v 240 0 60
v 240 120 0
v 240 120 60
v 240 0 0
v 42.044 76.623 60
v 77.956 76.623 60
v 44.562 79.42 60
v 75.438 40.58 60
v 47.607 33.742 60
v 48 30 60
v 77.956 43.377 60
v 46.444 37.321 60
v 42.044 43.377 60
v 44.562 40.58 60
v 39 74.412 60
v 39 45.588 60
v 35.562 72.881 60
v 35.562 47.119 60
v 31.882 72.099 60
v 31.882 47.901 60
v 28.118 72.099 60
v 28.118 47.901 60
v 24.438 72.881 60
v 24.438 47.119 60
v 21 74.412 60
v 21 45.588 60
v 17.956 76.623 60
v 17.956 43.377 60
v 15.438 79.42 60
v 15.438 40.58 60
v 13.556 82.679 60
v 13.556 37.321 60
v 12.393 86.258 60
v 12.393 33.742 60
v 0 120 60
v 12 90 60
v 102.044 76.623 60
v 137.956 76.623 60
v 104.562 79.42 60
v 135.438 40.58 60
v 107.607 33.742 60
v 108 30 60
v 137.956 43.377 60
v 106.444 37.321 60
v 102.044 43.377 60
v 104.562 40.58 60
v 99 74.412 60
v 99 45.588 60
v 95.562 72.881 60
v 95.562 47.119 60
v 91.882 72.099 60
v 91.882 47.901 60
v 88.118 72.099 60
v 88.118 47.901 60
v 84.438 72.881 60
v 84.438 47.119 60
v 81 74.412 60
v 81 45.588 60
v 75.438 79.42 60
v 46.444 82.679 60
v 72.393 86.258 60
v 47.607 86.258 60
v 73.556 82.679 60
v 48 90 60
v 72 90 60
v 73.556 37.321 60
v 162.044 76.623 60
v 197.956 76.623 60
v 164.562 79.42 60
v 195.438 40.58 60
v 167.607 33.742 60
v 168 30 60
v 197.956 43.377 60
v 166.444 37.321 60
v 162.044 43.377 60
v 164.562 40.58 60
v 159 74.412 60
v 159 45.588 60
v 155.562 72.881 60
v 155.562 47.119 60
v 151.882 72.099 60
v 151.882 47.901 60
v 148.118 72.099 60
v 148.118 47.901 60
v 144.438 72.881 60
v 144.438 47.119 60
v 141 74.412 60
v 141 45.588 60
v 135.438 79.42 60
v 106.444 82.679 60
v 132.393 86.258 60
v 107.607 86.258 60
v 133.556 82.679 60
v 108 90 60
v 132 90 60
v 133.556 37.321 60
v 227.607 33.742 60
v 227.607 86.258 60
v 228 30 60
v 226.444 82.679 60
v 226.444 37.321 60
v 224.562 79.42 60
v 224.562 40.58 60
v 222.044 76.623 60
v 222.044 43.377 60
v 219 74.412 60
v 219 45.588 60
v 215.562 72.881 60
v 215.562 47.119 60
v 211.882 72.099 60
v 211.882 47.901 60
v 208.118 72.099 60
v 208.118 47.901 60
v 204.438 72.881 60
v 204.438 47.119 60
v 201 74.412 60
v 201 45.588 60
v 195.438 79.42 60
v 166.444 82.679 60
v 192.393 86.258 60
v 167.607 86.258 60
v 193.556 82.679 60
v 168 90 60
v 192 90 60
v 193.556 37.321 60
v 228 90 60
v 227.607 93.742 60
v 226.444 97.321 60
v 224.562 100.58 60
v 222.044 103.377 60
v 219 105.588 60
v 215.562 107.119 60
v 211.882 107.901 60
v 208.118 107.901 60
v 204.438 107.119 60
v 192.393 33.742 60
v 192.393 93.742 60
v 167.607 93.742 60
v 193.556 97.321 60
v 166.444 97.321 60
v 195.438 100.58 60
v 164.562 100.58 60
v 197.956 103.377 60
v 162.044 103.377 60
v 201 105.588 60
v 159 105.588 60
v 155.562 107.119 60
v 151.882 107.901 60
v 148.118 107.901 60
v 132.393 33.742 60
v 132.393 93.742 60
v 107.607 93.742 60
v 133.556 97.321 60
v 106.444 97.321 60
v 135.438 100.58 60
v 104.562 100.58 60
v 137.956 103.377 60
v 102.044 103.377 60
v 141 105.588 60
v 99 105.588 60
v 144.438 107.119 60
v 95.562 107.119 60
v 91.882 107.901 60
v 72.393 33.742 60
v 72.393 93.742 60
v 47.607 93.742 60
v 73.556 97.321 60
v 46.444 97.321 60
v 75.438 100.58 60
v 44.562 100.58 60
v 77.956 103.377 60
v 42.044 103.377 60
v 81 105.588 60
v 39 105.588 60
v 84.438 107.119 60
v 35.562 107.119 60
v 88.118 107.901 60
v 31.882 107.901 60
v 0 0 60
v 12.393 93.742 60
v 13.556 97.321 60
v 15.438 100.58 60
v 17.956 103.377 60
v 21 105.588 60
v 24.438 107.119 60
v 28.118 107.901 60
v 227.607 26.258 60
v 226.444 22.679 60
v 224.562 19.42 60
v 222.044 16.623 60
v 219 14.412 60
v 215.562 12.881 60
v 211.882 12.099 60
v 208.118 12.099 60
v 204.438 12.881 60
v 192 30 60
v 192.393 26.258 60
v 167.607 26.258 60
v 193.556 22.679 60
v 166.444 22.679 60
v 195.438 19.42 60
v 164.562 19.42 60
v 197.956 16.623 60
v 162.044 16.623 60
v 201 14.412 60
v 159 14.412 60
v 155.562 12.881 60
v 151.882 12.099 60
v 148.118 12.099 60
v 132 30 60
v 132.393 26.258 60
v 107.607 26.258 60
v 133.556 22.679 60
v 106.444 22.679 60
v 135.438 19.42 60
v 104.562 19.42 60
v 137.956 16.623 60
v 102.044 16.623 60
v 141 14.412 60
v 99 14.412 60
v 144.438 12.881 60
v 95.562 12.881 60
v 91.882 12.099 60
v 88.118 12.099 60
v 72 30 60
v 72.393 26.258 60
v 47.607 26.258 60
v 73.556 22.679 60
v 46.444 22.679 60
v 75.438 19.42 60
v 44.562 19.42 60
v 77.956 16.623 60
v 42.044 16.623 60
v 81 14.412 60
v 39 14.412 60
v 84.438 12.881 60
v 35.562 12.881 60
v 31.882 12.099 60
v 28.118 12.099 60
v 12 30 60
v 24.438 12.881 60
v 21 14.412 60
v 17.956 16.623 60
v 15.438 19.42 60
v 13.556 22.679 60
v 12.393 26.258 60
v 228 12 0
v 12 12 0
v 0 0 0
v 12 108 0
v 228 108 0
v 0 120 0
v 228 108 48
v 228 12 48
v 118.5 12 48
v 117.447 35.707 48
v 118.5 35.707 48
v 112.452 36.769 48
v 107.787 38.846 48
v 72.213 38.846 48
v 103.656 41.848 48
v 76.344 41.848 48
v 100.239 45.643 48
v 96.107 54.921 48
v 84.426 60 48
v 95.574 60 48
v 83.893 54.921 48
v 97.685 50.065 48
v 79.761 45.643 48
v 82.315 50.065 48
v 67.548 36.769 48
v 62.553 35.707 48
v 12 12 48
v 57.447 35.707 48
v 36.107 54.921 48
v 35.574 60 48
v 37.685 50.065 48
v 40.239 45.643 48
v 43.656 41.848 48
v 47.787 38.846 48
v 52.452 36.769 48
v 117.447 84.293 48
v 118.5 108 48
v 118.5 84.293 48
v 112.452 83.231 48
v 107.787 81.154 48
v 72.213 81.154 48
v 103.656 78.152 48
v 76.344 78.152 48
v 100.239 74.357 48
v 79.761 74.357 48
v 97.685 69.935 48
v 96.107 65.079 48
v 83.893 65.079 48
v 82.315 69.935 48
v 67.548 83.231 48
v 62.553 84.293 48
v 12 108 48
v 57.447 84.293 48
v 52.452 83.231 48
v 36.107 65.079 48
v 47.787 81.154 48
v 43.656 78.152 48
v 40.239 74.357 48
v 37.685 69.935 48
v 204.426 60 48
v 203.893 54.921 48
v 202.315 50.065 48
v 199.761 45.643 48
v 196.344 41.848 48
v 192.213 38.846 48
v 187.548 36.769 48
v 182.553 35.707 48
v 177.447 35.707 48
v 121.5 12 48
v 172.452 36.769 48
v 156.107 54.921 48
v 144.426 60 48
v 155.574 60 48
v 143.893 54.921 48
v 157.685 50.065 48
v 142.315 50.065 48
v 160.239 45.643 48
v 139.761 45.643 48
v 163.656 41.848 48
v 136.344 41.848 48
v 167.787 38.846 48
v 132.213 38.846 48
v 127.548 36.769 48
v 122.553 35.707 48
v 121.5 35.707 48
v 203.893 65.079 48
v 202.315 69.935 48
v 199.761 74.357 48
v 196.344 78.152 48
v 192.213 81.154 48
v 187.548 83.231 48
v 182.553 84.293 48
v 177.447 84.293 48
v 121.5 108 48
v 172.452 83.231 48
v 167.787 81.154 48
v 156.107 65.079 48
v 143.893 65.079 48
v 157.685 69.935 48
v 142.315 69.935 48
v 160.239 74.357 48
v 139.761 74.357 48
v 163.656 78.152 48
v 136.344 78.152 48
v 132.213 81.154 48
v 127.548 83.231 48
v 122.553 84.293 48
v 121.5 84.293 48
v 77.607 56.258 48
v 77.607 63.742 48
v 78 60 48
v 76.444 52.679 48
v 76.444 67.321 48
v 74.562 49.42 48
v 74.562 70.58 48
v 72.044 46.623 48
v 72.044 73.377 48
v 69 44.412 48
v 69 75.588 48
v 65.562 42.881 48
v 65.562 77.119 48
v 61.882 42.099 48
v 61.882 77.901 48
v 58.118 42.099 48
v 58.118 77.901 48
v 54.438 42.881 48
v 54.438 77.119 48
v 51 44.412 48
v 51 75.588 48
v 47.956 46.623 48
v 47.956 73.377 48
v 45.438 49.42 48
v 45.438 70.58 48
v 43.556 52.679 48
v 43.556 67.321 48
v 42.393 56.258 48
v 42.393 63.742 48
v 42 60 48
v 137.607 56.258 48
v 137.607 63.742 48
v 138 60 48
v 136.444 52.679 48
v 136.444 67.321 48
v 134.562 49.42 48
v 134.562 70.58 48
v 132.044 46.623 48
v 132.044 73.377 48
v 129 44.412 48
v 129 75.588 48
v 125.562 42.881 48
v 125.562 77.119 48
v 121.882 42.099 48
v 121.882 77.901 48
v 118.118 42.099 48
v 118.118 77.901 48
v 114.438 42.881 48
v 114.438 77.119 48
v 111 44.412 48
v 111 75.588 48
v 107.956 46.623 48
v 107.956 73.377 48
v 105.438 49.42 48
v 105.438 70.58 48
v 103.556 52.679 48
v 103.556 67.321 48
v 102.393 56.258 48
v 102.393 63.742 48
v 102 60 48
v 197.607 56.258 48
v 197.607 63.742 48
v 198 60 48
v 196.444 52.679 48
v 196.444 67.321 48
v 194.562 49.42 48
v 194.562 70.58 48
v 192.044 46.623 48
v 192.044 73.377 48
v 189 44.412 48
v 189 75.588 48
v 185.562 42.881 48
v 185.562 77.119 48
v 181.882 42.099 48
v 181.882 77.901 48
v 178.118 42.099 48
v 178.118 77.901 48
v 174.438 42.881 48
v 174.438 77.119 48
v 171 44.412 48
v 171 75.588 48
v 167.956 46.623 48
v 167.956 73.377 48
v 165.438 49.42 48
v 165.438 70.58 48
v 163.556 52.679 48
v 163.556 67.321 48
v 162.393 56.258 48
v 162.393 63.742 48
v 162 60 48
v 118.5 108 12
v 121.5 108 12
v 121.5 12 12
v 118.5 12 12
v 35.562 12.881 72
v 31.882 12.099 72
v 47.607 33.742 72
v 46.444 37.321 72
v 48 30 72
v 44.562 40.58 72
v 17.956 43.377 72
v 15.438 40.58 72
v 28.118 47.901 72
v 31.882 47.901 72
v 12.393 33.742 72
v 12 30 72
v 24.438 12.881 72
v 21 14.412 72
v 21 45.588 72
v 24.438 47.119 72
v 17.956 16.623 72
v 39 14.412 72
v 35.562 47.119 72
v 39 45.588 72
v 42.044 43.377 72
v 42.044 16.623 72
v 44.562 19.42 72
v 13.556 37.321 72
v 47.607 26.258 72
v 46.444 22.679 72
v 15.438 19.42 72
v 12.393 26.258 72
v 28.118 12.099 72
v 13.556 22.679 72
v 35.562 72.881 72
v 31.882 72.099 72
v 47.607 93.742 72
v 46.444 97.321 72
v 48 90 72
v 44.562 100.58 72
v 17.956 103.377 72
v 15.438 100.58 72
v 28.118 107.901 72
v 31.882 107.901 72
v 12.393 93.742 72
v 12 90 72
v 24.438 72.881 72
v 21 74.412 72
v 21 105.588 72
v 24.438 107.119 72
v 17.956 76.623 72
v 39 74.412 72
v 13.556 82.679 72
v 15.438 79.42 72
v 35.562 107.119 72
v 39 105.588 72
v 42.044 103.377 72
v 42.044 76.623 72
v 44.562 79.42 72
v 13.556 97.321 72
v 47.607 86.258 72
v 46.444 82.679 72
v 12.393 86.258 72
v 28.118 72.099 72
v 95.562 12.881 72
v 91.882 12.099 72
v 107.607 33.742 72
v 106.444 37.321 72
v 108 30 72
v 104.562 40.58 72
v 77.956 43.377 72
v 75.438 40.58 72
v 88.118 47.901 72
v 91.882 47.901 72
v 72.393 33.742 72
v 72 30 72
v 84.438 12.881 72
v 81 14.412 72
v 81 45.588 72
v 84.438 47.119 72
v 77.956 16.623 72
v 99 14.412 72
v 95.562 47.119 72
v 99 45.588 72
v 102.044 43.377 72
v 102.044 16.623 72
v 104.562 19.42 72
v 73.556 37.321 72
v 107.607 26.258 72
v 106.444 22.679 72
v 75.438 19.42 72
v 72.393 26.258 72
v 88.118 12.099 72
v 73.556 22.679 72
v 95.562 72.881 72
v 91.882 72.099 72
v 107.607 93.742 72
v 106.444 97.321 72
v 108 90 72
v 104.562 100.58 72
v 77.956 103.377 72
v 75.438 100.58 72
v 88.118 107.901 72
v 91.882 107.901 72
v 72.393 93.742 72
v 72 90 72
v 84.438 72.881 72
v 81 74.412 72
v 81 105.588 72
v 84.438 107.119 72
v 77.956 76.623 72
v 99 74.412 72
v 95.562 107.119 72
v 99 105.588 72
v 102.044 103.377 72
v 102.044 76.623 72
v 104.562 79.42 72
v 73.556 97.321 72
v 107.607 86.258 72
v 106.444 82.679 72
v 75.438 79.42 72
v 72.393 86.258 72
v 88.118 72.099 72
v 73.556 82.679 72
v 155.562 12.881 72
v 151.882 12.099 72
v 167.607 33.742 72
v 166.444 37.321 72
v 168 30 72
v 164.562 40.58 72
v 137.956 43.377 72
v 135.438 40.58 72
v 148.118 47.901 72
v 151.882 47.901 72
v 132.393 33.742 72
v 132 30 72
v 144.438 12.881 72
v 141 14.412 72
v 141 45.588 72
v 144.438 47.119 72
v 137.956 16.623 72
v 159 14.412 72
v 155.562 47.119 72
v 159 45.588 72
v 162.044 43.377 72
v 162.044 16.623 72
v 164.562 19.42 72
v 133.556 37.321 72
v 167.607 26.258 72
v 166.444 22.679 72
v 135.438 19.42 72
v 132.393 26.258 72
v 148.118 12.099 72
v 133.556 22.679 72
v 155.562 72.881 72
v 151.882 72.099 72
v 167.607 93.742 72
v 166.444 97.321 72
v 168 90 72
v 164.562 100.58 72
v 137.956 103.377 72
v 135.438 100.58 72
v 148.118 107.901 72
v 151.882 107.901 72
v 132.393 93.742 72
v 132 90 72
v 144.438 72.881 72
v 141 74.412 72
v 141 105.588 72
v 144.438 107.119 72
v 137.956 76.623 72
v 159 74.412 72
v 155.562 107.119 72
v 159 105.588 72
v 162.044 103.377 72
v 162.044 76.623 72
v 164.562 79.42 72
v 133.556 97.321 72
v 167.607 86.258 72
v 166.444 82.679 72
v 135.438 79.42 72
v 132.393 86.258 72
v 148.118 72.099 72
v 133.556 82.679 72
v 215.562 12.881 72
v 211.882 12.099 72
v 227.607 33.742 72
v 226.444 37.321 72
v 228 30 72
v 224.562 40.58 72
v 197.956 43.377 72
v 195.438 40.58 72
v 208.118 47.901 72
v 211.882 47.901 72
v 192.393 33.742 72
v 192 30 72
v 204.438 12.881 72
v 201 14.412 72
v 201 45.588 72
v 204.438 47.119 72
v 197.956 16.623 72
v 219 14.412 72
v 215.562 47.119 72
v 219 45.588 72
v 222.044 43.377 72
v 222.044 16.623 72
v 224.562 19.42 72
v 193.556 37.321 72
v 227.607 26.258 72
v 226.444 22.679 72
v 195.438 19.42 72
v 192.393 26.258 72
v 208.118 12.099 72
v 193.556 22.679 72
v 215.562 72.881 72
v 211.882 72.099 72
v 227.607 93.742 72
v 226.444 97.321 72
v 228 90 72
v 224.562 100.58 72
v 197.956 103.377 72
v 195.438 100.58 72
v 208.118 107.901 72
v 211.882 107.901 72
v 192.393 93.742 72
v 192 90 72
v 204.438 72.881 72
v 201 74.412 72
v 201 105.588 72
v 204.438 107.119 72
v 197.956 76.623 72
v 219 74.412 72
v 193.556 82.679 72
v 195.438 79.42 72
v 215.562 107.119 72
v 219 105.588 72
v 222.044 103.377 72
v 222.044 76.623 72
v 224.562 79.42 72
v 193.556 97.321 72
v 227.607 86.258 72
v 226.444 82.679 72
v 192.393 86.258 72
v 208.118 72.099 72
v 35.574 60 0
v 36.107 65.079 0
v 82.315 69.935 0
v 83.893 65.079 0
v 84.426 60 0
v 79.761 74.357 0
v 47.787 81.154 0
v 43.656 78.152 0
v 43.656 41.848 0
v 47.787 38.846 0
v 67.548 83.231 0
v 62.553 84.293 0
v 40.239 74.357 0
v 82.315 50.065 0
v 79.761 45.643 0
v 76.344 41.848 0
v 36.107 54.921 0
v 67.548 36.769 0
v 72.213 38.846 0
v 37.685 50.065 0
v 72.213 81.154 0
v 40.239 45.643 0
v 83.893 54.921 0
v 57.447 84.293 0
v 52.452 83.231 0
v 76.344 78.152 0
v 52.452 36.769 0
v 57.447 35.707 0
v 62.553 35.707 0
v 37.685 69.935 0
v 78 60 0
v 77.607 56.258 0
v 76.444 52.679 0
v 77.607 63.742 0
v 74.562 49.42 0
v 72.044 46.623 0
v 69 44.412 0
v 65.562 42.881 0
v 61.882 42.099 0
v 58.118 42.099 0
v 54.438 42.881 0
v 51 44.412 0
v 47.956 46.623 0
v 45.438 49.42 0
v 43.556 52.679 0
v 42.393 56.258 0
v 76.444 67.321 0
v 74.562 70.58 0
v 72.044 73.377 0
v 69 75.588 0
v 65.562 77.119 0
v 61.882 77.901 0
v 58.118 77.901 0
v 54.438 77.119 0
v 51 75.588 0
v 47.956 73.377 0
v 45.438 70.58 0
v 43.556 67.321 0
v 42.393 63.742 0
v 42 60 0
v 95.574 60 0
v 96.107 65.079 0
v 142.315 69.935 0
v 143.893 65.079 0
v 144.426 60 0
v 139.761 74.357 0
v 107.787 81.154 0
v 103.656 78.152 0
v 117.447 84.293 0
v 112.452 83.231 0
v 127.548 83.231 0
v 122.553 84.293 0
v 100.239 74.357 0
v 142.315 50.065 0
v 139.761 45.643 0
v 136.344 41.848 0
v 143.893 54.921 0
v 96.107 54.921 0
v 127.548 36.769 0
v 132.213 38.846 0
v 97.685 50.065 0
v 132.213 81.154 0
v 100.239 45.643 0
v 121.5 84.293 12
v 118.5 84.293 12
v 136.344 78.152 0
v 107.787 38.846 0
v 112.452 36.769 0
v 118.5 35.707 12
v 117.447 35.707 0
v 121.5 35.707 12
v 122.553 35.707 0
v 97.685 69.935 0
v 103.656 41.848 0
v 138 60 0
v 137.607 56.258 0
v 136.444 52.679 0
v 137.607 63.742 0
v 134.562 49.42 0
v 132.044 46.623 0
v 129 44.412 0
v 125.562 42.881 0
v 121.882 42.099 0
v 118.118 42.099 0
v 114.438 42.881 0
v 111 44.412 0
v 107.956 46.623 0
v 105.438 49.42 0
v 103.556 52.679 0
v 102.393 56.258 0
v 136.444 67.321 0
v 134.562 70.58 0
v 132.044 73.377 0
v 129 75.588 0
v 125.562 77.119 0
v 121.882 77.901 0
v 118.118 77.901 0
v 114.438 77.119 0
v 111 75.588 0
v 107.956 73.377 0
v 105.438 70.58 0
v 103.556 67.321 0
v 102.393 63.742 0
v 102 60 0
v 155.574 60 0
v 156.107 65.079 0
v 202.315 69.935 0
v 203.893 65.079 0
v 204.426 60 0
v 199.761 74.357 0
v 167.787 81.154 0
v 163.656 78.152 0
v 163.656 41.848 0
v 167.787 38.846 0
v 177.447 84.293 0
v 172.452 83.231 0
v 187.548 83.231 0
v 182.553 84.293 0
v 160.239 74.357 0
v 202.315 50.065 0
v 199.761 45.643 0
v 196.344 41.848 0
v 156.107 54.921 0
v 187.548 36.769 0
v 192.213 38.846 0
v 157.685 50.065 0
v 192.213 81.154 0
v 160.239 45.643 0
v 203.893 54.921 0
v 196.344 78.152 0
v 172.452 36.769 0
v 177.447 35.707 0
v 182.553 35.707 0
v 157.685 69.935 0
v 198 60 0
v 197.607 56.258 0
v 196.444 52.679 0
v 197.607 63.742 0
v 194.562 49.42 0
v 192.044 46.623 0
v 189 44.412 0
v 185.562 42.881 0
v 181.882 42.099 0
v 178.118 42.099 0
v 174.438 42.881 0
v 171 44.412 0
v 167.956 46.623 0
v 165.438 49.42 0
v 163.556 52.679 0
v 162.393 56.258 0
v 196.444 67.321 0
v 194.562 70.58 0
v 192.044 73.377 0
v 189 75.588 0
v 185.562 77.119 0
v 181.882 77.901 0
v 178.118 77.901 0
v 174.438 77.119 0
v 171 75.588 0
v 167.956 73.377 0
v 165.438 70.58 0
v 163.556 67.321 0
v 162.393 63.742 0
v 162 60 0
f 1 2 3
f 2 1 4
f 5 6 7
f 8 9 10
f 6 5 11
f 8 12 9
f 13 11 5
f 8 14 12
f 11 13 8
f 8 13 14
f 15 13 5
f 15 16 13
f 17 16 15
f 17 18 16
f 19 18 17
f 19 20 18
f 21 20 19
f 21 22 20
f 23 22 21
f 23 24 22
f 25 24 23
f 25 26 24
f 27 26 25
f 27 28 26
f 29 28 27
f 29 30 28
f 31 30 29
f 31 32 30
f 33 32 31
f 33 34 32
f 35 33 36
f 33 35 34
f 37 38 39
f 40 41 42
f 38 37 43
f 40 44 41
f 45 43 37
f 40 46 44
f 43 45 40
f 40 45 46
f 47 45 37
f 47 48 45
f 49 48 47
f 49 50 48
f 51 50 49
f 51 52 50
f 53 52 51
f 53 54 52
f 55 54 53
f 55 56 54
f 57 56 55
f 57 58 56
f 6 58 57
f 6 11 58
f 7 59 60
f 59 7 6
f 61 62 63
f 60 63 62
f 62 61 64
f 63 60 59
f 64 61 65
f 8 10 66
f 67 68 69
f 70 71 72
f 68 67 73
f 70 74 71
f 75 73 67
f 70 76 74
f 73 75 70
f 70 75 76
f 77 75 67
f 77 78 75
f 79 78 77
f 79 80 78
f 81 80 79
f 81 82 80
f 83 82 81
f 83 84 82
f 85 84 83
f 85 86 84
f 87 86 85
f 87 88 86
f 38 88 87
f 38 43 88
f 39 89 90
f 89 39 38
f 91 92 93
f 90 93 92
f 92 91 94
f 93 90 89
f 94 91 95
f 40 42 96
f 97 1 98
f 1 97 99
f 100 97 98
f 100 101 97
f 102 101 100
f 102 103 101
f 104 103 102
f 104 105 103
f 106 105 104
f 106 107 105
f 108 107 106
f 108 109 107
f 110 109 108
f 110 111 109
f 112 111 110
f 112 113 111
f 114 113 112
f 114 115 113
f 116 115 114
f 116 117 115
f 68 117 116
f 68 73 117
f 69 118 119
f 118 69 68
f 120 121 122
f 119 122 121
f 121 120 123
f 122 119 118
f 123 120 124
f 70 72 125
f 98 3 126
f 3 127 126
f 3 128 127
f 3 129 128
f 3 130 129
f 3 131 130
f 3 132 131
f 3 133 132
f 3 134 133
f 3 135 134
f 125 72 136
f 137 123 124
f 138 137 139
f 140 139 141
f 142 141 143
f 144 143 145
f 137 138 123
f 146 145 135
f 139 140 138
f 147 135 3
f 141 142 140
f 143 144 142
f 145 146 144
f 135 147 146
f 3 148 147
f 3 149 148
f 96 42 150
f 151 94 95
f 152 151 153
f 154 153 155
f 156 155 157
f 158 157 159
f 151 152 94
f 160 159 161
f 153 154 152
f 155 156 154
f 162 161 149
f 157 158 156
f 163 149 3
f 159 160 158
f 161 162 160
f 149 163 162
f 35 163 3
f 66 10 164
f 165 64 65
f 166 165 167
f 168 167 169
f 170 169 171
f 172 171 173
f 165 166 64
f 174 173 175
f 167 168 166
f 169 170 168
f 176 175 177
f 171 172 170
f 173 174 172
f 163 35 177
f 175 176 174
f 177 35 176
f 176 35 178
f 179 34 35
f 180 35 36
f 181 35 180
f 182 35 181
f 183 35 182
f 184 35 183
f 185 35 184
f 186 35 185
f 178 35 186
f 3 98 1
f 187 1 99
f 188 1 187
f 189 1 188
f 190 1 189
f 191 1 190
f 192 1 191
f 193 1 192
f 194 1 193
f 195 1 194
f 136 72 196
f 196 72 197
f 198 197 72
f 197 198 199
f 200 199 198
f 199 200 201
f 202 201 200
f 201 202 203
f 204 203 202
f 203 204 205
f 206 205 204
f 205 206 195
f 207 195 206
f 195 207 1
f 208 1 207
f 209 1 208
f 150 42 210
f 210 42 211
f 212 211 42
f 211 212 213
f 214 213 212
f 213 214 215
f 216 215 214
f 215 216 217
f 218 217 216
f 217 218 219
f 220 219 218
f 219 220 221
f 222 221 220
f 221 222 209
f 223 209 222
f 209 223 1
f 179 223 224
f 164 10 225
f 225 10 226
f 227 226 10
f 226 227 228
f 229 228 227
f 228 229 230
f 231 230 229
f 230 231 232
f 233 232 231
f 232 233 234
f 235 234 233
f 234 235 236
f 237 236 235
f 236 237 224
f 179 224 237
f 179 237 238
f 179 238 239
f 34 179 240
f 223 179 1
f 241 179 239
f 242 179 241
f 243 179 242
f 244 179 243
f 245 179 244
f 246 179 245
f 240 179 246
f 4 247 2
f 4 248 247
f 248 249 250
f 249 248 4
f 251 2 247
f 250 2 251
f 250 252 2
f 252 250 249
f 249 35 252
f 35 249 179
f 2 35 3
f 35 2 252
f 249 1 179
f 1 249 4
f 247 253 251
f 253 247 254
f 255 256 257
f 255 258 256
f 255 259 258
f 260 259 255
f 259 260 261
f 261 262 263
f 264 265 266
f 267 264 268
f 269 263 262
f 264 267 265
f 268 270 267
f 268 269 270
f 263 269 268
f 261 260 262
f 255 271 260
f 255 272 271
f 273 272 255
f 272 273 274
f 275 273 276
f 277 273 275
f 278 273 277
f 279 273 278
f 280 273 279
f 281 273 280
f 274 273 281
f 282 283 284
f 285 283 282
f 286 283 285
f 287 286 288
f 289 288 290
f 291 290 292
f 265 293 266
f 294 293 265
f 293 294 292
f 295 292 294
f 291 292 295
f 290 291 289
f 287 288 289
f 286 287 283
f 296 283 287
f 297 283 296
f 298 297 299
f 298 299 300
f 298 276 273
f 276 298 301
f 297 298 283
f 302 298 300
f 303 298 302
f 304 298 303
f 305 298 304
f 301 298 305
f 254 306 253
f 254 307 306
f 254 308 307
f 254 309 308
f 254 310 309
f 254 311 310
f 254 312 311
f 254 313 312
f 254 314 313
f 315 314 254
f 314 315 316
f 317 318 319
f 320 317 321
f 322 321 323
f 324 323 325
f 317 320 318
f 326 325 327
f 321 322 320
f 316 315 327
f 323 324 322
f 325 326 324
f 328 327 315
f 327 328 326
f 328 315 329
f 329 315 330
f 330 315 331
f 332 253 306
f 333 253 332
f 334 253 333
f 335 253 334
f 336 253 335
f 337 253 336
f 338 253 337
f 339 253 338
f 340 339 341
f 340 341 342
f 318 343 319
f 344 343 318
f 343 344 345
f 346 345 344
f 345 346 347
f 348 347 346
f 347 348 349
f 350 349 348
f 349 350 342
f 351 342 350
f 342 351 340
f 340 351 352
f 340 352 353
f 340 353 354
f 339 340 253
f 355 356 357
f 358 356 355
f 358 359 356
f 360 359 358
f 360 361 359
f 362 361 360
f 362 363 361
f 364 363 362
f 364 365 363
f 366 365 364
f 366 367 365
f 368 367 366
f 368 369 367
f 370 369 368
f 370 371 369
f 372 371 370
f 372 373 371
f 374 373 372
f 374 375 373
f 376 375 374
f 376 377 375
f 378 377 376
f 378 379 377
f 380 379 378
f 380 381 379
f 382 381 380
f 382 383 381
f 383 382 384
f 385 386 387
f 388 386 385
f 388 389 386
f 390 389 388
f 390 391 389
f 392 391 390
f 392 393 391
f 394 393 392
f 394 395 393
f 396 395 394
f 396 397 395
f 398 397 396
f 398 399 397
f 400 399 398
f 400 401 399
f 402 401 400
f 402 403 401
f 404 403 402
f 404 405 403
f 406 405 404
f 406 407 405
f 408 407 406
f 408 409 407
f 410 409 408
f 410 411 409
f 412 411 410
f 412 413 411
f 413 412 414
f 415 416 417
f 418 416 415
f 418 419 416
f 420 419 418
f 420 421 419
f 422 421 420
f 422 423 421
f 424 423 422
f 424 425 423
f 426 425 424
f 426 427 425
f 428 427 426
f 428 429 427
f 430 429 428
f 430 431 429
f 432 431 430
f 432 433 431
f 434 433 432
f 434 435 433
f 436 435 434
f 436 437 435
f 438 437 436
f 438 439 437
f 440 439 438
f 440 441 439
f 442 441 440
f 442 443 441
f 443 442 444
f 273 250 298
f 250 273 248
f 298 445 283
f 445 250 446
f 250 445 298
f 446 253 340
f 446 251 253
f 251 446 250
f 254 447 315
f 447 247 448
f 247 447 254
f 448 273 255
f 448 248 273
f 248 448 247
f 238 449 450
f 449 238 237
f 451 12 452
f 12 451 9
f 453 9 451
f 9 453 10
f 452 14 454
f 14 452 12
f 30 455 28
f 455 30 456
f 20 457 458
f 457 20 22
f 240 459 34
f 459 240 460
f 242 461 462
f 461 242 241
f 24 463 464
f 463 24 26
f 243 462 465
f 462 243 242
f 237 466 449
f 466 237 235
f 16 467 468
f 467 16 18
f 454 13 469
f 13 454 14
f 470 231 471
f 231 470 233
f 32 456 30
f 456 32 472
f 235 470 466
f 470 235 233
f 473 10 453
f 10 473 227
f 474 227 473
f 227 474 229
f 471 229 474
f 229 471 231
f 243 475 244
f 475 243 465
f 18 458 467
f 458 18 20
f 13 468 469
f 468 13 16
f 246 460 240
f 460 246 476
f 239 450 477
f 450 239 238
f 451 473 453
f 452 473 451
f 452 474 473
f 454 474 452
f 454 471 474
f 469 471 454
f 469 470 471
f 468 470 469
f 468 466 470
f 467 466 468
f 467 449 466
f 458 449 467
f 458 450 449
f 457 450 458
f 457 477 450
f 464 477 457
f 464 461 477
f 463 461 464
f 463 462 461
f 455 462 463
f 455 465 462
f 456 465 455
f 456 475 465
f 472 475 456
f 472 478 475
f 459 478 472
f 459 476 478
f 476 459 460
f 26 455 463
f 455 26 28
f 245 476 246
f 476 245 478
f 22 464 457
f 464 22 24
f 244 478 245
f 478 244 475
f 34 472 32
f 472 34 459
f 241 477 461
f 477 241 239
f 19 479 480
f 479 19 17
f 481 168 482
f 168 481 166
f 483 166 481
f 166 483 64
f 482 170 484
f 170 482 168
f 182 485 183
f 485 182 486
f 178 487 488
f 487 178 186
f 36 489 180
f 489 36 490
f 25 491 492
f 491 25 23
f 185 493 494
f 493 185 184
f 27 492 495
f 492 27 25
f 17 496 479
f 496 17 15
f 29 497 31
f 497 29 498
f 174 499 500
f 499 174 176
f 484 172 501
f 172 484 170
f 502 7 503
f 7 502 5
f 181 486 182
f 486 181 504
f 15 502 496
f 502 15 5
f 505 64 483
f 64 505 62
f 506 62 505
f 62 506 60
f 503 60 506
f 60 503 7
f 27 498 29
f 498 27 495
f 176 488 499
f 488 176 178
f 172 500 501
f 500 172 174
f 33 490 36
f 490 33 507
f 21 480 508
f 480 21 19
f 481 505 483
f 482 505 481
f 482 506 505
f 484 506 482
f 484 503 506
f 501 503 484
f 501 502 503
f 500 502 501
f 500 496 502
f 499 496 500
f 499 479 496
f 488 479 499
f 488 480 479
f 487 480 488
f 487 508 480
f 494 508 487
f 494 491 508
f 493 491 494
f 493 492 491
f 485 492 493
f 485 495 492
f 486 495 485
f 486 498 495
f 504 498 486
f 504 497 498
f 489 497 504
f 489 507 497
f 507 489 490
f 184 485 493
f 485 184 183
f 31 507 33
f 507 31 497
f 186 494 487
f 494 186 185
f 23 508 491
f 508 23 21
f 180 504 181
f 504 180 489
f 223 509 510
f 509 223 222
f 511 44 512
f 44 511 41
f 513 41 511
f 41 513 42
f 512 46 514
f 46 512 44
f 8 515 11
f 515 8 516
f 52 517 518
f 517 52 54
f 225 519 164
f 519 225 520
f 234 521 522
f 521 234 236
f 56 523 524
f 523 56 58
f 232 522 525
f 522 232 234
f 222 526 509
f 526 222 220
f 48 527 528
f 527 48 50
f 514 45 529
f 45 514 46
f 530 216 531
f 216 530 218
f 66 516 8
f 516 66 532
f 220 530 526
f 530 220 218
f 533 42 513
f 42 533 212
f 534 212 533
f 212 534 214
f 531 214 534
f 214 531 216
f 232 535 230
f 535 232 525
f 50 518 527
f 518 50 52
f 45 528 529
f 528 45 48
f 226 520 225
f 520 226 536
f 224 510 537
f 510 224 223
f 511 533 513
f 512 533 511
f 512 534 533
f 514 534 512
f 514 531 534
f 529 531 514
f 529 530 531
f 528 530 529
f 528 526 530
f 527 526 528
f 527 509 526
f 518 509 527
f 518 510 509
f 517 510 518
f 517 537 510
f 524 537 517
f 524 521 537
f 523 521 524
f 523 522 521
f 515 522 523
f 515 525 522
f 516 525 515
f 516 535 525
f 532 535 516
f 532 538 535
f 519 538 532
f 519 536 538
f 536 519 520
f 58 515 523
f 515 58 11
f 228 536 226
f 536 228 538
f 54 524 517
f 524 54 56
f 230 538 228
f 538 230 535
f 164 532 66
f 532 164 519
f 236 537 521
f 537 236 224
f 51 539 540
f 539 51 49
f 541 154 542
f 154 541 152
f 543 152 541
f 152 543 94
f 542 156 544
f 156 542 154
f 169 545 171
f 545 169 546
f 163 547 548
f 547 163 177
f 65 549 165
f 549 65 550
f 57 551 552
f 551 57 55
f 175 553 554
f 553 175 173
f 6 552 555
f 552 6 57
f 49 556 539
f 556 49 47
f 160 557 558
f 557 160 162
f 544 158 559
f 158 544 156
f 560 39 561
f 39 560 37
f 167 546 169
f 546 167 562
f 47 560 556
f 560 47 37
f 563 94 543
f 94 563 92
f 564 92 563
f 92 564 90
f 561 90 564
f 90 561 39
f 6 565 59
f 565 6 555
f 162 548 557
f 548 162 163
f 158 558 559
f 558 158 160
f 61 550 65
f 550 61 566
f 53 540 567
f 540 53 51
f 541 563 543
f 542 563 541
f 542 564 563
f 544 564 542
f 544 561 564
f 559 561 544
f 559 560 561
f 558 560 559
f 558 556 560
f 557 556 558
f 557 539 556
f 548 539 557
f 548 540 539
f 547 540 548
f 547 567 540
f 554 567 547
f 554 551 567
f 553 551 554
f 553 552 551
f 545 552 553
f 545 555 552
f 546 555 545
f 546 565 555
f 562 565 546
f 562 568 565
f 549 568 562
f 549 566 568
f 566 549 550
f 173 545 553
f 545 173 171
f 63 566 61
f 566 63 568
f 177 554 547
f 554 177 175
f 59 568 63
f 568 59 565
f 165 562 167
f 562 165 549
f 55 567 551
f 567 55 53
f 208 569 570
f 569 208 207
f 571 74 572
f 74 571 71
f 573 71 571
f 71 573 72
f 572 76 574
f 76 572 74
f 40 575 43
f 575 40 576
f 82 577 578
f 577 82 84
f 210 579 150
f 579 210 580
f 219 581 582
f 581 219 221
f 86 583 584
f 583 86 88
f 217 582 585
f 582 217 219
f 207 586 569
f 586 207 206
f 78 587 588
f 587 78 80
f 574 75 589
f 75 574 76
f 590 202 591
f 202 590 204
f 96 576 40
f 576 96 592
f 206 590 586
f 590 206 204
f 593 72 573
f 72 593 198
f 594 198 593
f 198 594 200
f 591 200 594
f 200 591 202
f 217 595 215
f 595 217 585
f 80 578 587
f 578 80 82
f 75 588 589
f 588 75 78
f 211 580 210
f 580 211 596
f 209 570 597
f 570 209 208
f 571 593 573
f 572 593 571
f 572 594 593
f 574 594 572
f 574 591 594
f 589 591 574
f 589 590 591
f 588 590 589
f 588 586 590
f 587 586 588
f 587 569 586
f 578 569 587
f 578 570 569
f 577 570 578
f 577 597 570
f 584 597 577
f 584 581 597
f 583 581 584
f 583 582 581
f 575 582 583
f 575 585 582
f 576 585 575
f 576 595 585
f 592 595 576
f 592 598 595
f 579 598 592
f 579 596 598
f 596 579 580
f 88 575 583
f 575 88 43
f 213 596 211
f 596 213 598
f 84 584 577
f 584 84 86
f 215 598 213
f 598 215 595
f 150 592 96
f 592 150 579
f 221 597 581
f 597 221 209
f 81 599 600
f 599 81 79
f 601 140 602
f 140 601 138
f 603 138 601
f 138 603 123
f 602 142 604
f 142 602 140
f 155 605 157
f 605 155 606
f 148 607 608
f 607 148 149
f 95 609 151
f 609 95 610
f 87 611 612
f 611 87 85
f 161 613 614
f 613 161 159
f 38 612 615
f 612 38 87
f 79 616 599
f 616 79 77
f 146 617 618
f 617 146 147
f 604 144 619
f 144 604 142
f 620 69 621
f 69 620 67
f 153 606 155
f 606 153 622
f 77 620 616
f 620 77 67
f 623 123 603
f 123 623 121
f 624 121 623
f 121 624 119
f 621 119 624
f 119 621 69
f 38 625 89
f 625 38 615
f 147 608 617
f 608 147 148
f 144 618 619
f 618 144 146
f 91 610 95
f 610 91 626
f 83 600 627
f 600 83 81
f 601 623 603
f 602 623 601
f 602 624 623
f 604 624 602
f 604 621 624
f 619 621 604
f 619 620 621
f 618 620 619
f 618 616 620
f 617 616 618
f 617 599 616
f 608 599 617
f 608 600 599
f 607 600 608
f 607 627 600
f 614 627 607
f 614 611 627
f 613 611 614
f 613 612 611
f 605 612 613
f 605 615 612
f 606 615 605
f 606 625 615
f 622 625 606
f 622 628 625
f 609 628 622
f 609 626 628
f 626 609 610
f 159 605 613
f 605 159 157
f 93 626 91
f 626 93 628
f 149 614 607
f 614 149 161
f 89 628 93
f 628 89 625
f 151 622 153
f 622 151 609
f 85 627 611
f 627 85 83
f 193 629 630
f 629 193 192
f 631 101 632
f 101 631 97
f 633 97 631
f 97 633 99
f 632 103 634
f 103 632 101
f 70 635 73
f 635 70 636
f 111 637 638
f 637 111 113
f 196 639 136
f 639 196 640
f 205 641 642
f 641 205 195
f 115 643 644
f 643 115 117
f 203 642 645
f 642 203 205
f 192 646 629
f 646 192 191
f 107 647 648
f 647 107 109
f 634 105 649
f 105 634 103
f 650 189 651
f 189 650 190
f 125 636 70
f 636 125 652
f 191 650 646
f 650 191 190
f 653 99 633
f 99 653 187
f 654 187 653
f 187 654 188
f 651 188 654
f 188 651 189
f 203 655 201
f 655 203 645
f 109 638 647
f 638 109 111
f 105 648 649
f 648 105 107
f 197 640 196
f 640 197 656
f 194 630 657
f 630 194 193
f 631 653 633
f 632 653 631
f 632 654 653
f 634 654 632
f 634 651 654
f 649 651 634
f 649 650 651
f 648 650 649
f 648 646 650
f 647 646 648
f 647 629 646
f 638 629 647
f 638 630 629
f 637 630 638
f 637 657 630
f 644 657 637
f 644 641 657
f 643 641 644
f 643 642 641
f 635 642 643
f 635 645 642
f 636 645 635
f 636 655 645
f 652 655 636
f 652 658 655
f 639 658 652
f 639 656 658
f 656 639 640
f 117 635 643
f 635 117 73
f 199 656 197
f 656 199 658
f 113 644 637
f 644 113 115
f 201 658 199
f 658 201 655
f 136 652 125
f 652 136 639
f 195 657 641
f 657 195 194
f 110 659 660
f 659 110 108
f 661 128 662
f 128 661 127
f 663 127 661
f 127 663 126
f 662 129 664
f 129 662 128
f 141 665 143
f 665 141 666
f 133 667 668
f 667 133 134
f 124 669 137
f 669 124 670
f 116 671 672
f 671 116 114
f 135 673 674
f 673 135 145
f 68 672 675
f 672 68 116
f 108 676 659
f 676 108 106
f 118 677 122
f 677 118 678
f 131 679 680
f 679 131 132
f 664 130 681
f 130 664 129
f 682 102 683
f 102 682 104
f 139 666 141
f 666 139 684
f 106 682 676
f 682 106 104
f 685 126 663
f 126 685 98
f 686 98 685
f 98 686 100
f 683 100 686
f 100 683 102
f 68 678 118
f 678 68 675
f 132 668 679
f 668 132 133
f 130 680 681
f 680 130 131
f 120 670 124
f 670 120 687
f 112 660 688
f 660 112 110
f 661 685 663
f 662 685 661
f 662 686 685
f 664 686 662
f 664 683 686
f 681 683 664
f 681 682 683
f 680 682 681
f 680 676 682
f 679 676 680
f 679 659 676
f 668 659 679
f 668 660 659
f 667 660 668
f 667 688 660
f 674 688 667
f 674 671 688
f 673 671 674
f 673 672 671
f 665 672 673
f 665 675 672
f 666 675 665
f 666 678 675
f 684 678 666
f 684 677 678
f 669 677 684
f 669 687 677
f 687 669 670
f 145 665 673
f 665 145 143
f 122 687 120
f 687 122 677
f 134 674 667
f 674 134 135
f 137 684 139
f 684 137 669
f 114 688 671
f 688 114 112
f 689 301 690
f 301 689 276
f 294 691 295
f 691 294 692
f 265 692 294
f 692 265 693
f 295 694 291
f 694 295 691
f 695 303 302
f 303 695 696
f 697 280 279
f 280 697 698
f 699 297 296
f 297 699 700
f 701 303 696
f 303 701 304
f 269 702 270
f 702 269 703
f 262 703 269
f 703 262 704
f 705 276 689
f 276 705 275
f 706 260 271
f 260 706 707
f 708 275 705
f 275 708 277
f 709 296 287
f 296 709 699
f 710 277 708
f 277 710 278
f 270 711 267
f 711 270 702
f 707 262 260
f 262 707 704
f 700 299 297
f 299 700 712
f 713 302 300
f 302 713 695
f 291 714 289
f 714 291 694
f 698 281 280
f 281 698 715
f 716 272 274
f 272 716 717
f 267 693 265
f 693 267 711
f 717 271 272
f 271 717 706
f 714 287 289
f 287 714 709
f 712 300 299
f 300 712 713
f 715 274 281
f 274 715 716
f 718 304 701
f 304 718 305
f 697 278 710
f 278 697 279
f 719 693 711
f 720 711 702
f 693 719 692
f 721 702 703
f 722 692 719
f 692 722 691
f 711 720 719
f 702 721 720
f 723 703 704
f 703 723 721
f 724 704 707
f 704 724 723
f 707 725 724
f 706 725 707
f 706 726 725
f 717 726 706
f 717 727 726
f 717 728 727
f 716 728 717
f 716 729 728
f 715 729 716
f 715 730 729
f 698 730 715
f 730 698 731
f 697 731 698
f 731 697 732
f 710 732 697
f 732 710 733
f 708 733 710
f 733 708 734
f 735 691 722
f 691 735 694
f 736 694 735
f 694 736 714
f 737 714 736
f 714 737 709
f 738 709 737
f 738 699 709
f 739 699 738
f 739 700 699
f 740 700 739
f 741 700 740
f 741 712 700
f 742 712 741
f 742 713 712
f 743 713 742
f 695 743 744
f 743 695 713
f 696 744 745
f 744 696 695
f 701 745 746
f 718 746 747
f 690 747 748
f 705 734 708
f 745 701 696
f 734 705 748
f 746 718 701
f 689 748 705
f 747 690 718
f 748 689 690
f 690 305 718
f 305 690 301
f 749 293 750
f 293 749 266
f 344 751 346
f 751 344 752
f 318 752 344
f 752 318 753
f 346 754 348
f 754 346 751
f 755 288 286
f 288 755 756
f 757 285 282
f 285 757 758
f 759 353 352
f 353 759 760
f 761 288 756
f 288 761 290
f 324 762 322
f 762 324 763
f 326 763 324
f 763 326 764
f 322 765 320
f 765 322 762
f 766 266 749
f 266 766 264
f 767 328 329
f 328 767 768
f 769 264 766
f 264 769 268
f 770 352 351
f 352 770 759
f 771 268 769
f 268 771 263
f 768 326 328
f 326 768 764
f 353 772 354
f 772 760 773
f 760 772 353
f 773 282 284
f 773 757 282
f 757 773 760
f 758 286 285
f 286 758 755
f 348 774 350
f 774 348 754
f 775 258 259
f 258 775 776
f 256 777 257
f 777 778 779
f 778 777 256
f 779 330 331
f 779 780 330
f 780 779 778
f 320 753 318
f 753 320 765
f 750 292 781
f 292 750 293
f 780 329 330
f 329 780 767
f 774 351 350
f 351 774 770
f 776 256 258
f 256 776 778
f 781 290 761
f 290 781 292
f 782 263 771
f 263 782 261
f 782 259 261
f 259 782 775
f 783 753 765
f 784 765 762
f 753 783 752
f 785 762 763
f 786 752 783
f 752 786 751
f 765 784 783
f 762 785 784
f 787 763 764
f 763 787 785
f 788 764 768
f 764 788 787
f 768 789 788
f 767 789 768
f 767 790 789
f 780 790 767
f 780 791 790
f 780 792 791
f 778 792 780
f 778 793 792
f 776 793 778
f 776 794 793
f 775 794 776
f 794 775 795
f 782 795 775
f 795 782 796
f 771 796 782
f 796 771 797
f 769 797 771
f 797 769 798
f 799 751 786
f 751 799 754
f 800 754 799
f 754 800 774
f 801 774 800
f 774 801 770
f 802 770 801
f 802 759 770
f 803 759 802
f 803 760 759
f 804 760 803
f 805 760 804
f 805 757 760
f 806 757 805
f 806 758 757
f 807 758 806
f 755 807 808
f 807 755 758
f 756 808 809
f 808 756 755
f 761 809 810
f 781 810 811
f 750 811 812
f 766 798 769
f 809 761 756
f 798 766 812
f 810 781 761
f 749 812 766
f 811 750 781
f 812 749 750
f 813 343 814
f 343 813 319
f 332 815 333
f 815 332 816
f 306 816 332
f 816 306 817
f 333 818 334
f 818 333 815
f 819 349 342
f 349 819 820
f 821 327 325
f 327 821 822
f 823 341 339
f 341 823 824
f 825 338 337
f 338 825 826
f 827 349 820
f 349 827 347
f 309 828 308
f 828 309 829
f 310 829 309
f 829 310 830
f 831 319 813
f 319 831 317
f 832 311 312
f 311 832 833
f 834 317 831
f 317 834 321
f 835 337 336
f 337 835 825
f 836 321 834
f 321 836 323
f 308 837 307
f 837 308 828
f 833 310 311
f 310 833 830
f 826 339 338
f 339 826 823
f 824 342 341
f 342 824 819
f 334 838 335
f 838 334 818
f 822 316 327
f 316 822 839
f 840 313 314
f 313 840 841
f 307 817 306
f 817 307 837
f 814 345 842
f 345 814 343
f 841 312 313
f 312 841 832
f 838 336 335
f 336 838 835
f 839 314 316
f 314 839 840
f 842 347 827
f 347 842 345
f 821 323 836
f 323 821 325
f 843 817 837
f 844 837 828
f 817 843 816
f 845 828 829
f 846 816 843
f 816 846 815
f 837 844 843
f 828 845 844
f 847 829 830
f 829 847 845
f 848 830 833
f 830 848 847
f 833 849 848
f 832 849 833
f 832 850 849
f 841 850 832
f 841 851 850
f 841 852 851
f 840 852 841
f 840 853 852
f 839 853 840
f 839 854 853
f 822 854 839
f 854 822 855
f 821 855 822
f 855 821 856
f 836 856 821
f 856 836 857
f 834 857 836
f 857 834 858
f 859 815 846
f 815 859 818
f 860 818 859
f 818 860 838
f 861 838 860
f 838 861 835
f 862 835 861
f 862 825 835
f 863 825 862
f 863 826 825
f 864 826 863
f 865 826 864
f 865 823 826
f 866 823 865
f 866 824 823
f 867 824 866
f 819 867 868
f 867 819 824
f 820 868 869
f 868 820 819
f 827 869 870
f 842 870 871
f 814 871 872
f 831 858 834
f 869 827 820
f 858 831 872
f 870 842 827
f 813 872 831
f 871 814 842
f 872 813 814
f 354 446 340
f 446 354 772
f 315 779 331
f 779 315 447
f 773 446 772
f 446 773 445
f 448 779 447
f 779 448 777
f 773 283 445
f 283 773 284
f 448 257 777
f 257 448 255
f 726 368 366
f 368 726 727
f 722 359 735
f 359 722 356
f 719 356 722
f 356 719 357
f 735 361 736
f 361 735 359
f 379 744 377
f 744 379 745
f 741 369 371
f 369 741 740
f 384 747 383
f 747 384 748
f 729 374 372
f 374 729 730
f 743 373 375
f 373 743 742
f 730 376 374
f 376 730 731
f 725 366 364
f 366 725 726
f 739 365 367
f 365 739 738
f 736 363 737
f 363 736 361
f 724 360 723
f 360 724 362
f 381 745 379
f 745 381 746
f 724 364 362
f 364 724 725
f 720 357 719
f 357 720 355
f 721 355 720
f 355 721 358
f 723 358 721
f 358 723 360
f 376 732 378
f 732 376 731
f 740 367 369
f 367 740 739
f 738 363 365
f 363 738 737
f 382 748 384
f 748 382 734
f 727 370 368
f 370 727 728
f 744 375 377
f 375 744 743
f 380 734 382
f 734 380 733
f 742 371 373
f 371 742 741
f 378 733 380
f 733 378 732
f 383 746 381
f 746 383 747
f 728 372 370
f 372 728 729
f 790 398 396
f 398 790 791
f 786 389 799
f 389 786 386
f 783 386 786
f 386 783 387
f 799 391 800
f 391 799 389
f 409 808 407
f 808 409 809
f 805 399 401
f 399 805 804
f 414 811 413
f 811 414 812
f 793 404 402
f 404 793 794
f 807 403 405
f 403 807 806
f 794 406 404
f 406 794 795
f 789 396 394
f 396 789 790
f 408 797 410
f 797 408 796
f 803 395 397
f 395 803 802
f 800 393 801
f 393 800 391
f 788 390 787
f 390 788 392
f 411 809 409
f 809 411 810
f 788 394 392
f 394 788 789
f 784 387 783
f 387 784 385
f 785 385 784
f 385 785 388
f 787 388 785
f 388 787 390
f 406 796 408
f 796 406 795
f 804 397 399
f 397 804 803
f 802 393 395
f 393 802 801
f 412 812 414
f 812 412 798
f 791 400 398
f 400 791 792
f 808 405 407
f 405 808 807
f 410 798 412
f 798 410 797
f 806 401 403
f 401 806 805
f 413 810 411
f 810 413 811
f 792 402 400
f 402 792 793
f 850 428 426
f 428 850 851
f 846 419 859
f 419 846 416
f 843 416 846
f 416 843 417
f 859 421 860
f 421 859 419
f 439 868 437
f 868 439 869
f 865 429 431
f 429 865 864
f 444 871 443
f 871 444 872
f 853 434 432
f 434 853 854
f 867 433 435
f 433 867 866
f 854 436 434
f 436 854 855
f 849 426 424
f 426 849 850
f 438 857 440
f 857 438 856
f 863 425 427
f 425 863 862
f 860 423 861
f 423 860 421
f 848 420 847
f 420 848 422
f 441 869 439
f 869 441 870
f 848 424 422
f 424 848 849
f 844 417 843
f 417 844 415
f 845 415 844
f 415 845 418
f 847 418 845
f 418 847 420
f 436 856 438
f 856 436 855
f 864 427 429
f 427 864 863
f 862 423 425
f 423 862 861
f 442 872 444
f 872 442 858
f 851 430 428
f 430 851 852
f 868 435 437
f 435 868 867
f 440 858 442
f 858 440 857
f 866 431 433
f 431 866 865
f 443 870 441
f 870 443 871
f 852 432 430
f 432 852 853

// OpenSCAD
lego_unit = 60;
lego_height = 60;
lego_button_radius = 18;
lego_wall_width = lego_unit/2 - lego_button_radius;
lego_button_height = 2*lego_wall_width;
base_pin_radius = lego_wall_width;
base_circle_radius = (lego_unit*sqrt(2) - 2*lego_button_radius)/2;

module lego_brick(brick_length=4, brick_width=2){

union(){
	difference(){
		cube([lego_unit*brick_length, lego_unit*brick_width, lego_height]);

		translate([lego_wall_width, lego_wall_width, -lego_wall_width])
		  cube([lego_unit*brick_length - 2*lego_wall_width, lego_unit*brick_width - 2*lego_wall_width, lego_height]);
	}

	//buttons
	for (i = [0:brick_length-1]) {
		for (j = [0:brick_width-1]) {
			translate([lego_unit/2+i*lego_unit, lego_unit/2+j*lego_unit,lego_height+1]) cylinder(r=lego_button_radius,h=lego_button_height-2,center=true);
		}
	}

	if (brick_width==1){
		if (brick_length>1){
			//base pins
			for (i = [1:brick_length-1]) {
				translate([i*lego_unit, lego_unit/2, lego_height/2]) cylinder(r=base_pin_radius, h=lego_height, center=true);
			}
		}

		if (brick_length > 3){
			for (i = [1:(brick_length/2-1)]) {
				translate([i*2*lego_unit, lego_unit/2, lego_height/2+lego_wall_width/4]) cube([lego_wall_width, lego_unit,lego_height-lego_wall_width/2], center=true);
			}
		}
	} else {
		difference(){
			union(){
				//body of the base circles
				for (i = [1:brick_length-1]) {
					translate([i*lego_unit, lego_unit, lego_height/2])
					difference(){
						cylinder(r=base_circle_radius, h=lego_height, center=true);
					}
				}

				//inner walls
				if (brick_length > 3){
					for (i = [1:(brick_length/2-1)]) {
						translate([i*2*lego_unit, lego_unit, lego_height/2+lego_wall_width/2]) cube([lego_wall_width/4, 2*lego_unit,lego_height-lego_wall_width], center=true);
					}
				}
			}
			
			//holes of the base circles
			for (i = [1:brick_length-1]) {
				translate([i*lego_unit, lego_unit, lego_height/2])
				cylinder(r=lego_button_radius, h=lego_height+1, center=true);
			}

		}

	}
}

}

lego_brick();
